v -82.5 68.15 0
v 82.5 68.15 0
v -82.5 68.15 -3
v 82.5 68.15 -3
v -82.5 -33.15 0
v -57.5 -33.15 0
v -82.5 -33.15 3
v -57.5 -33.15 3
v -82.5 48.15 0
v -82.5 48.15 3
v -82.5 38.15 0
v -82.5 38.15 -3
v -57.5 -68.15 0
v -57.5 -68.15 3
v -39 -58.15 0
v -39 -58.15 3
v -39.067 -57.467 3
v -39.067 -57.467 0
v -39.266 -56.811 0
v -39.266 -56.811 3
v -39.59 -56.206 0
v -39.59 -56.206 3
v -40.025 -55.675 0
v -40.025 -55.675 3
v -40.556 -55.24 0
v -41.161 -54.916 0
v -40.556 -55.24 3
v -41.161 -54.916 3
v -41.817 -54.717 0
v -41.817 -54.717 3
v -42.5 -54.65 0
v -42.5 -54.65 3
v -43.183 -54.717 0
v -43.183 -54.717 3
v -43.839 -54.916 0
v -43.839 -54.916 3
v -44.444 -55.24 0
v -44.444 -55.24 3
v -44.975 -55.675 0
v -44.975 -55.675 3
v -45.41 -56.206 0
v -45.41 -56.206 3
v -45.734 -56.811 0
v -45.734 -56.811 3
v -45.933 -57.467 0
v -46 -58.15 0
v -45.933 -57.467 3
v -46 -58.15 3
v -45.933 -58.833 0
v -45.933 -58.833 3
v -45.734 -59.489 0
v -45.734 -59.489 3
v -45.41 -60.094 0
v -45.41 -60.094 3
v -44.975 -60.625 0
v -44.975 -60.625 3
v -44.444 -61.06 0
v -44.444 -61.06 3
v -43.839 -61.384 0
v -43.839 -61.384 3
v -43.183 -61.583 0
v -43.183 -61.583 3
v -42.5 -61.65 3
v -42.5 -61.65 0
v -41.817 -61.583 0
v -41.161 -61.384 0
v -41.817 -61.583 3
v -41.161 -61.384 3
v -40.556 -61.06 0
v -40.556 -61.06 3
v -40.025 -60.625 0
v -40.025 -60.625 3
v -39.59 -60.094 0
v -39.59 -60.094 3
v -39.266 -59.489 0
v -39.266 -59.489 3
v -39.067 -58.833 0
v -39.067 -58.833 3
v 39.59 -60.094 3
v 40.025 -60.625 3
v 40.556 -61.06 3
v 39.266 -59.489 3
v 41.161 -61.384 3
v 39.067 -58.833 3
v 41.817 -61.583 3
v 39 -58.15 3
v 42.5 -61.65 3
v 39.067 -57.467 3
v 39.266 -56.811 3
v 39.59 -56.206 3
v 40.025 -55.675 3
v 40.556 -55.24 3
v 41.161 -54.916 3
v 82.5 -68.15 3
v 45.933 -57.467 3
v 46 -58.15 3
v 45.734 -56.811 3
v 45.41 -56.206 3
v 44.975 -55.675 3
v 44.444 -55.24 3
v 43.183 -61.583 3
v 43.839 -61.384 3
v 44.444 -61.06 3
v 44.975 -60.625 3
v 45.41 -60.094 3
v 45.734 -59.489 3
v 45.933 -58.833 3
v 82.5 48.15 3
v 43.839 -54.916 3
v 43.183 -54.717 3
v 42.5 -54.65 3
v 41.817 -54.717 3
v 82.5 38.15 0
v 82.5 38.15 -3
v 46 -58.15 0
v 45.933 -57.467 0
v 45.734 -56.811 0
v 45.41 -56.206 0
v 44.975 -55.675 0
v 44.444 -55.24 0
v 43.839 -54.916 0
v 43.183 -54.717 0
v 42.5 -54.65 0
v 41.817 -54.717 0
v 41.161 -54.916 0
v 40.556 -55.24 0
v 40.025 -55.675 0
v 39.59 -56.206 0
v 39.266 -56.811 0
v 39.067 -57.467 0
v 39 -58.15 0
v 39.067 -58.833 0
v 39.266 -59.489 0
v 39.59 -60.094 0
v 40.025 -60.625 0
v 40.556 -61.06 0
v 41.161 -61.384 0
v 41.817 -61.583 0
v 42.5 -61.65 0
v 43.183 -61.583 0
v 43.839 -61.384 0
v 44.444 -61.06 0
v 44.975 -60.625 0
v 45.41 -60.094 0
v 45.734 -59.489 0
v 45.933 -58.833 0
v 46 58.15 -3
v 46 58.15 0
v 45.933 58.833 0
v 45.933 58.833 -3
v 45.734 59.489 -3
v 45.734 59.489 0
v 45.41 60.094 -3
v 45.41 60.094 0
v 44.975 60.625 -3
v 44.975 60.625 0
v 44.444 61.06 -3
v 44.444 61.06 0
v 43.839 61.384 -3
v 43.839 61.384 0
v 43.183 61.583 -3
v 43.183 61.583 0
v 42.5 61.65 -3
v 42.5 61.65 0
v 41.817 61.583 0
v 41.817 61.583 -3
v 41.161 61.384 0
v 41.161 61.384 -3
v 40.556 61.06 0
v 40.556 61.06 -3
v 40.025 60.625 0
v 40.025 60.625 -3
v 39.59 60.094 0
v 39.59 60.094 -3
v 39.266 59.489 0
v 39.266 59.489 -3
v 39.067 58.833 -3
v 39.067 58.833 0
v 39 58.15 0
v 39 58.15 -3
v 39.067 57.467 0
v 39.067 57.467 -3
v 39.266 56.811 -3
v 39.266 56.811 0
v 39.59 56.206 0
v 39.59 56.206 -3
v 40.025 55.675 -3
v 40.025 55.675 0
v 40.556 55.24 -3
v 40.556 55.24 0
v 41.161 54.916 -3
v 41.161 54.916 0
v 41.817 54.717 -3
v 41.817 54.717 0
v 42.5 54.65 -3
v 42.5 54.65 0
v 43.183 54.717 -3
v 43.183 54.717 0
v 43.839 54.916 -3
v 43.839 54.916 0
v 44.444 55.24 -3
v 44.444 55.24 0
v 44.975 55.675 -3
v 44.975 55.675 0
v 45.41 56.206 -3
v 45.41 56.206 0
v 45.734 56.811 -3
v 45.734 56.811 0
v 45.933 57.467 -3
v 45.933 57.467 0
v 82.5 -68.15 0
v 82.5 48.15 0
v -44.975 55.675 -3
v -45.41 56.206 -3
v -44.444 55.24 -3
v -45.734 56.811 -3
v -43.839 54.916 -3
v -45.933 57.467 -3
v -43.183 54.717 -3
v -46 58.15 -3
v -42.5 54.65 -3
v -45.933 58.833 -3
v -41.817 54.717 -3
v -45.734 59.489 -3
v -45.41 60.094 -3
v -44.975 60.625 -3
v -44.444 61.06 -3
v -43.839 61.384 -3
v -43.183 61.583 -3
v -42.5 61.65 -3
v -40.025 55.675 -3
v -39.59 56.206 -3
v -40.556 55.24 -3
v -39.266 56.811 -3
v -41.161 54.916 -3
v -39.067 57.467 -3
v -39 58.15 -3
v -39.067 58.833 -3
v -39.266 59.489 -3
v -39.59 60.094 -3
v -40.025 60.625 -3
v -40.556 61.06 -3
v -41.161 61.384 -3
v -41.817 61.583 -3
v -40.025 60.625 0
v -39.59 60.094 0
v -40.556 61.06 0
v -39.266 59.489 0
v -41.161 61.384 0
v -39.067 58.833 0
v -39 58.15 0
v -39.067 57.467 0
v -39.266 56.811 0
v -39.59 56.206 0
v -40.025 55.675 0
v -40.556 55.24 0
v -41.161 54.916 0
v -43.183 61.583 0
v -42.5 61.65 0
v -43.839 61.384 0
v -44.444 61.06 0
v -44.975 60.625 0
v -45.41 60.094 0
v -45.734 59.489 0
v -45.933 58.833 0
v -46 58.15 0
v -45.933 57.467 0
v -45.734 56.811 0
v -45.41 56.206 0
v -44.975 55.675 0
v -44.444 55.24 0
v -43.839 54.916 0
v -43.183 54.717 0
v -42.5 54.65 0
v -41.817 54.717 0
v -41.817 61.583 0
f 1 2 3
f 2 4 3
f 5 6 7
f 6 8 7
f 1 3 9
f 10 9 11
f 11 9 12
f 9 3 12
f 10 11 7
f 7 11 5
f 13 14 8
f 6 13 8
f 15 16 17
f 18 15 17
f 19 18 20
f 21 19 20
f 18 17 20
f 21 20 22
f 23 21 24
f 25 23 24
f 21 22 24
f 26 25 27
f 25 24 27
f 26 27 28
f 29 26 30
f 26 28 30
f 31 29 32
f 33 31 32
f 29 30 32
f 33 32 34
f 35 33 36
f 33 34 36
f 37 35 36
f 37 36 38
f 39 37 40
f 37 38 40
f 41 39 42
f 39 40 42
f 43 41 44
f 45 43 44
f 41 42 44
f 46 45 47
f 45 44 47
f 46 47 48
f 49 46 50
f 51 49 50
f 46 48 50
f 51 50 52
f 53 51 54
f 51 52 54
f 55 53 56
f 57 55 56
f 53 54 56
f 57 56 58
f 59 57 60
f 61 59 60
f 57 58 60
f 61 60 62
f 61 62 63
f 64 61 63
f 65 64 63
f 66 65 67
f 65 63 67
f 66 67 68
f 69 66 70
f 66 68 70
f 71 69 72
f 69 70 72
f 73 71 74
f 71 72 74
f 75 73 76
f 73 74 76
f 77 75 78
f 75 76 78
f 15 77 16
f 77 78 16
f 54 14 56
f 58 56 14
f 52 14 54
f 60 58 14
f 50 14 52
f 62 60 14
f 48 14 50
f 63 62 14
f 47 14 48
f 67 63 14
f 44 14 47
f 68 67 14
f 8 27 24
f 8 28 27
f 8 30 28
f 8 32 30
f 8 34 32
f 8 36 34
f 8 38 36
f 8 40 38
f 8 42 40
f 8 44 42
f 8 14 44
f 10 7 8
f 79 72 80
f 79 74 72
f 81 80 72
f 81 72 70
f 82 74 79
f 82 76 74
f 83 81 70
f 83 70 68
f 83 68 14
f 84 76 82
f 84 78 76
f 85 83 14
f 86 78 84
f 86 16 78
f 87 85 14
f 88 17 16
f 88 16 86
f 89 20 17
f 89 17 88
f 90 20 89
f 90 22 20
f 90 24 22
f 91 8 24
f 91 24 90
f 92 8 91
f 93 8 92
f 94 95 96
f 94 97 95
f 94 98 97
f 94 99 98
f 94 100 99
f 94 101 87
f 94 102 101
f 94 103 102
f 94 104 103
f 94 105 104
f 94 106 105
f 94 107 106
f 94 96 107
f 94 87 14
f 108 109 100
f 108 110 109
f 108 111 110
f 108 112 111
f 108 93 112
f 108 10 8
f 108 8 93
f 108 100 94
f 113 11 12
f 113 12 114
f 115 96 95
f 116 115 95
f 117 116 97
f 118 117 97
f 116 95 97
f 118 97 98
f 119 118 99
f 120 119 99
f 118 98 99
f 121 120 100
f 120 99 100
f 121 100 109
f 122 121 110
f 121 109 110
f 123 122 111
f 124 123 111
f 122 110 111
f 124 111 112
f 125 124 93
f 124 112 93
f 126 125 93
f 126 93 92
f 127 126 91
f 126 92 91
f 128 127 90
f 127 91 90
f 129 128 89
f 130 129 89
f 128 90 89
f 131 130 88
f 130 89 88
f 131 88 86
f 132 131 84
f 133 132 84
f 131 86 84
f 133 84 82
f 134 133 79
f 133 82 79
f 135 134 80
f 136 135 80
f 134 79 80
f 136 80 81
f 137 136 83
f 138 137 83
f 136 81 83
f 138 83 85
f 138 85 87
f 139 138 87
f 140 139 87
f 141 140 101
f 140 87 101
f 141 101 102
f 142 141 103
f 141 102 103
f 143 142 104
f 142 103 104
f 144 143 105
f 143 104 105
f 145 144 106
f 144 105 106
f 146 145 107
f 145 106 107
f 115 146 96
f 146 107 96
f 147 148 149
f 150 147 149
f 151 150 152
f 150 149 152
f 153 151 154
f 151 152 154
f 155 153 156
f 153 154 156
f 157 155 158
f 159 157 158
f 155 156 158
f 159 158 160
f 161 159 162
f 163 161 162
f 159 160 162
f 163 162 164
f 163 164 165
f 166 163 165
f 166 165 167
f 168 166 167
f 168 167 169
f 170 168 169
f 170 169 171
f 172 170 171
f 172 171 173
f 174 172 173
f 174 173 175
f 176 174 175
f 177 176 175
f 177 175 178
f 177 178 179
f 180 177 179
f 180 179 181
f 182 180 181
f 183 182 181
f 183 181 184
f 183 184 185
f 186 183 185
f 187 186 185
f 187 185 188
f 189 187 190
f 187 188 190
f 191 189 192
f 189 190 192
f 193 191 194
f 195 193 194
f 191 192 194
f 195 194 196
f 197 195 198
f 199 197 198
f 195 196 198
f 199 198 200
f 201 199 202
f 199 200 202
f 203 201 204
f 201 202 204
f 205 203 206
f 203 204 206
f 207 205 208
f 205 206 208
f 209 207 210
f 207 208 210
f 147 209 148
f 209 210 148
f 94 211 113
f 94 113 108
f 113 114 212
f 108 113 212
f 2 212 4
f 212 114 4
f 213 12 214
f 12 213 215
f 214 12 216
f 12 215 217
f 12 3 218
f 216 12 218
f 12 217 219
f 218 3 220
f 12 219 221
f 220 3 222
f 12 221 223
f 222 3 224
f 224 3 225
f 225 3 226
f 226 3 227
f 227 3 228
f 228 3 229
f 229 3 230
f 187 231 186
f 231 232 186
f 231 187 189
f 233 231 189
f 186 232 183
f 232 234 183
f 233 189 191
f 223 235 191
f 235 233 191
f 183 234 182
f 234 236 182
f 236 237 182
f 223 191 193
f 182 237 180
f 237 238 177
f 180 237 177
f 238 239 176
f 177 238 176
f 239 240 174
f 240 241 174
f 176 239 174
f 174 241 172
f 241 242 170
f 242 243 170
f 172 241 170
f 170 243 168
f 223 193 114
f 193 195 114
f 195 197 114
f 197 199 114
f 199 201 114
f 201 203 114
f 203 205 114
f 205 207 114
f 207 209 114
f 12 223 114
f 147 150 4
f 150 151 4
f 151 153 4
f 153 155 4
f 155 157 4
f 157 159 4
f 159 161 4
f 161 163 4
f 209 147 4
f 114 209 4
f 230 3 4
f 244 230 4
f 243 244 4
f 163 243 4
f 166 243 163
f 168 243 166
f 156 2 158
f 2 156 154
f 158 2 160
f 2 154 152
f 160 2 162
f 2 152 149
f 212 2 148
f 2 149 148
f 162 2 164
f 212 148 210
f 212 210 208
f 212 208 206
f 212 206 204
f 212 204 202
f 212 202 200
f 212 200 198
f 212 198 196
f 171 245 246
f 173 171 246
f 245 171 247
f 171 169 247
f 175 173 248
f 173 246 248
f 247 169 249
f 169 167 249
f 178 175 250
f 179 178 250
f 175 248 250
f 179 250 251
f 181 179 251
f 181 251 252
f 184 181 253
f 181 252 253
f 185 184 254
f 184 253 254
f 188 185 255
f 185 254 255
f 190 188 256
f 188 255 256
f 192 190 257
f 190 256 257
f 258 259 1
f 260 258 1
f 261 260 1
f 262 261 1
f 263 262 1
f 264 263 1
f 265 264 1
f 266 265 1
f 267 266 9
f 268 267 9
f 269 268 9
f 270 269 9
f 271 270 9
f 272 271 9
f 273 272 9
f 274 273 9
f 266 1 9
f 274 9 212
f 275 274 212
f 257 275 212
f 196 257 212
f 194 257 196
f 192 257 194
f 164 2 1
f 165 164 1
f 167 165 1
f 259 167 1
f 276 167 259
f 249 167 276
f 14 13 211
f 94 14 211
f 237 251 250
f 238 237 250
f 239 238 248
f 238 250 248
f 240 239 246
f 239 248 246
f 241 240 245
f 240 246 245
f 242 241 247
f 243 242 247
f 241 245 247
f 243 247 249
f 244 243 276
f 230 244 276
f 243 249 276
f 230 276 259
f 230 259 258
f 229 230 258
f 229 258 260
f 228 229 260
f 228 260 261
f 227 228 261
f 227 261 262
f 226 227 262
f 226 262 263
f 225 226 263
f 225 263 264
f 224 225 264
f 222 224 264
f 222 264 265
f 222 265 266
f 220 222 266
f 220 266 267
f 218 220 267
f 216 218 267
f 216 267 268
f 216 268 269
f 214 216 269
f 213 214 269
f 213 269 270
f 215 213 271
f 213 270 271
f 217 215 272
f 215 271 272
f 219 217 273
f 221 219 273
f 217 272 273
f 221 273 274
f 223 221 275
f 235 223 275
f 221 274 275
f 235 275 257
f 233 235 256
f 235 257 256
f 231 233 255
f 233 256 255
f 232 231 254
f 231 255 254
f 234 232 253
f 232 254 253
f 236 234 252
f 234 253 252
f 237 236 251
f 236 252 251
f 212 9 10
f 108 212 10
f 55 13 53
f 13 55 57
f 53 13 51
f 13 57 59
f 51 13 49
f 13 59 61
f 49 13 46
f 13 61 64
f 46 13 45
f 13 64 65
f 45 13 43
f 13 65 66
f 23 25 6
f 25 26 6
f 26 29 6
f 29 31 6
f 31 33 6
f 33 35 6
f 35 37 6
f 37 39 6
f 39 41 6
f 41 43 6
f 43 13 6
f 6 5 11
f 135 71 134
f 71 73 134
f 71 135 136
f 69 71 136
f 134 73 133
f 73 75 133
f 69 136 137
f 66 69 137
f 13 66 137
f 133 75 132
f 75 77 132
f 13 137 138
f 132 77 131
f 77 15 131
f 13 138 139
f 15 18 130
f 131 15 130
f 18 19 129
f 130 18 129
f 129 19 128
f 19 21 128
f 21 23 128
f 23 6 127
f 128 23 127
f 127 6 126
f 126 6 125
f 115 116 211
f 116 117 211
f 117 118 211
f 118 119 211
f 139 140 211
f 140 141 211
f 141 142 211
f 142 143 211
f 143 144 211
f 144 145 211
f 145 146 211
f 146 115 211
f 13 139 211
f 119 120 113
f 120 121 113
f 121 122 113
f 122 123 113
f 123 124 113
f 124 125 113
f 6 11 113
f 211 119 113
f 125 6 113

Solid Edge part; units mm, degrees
sketch "Sketch1" plane through (0, 0, 0) normal (0, 0, 1) x (1, 0, 0)
  line L0 (-82.5, -68.15) -> (82.5, -68.15)
  line L1 (82.5, -68.15) -> (82.5, 68.15)
  line L2 (82.5, 68.15) -> (-82.5, 68.15)
  line L3 (-82.5, 68.15) -> (-82.5, -68.15)
  dimension "D1" = 165
  dimension "D2" = 136.3
extrude "Extrusionsausprägung_1" add sketch "Sketch1" along normal blind 3
sketch "Sketch2" plane through (0, 0, 3) normal (0, 0, 1) x (1, 0, 0)
  circle A0 centre (-42.5, 58.15) radius 3.5
  circle A1 centre (42.5, 58.15) radius 3.5
  circle A2 centre (42.5, -58.15) radius 3.5
  circle A3 centre (-42.5, -58.15) radius 3.5
  dimension "D1" = 7
  dimension "D2" = 85
  dimension "D3" = 40
  dimension "D4" = 116.3
  dimension "D5" = 10
extrude "Extrusionsausschnitt_1" cut sketch "Sketch2" against normal blind 245.2559
sketch "Sketch3" plane through (0, 0, 3) normal (0, 0, 1) x (1, 0, 0)
  line L0 (-82.5, -68.15) -> (-57.5, -68.15)
  line L1 (-57.5, -68.15) -> (-57.5, -33.15)
  line L2 (-57.5, -33.15) -> (-82.5, -33.15)
  line L3 (-82.5, -33.15) -> (-82.5, -68.15)
  dimension "D1" = 25
  dimension "D2" = 35
extrude "Cutout1" cut sketch "Sketch3" against normal through all
sketch "Sketch4" plane through (0, 0, 0) normal (0, 0, -1) x (-1, 0, 0)
  line L0 (-82.5, 68.15) -> (82.5, 68.15)
  line L1 (82.5, 68.15) -> (82.5, 38.15)
  line L2 (82.5, 38.15) -> (-82.5, 38.15)
  line L3 (-82.5, 38.15) -> (-82.5, 68.15)
  dimension "D1" = 30
  dimension "D2" = 165
extrude "Extrusionsausprägung_2" add sketch "Sketch4" along normal blind 3
sketch "Sketch5" plane through (0, 0, 3) normal (0, 0, 1) x (1, 0, 0)
  circle A0 centre (-42.5, 58.15) radius 3.5
  circle A1 centre (42.5, 58.15) radius 3.5
extrude "Cutout2" cut sketch "Sketch5" against normal through all
sketch "Sketch6" plane through (-82.5, 17.5, 0) normal (-1, 0, 0) x (0, 1, 0)
  line L0 (50.65, 0) -> (30.65, 0)
  line L1 (30.65, 0) -> (30.65, -3)
  line L2 (30.65, -3) -> (50.65, -3)
  line L3 (50.65, -3) -> (50.65, 0)
  dimension "D1" = 20
  dimension "D2" = 3
extrude "Cutout3" cut sketch "Sketch6" against normal through all
properties material "Nylon, allgemein"
